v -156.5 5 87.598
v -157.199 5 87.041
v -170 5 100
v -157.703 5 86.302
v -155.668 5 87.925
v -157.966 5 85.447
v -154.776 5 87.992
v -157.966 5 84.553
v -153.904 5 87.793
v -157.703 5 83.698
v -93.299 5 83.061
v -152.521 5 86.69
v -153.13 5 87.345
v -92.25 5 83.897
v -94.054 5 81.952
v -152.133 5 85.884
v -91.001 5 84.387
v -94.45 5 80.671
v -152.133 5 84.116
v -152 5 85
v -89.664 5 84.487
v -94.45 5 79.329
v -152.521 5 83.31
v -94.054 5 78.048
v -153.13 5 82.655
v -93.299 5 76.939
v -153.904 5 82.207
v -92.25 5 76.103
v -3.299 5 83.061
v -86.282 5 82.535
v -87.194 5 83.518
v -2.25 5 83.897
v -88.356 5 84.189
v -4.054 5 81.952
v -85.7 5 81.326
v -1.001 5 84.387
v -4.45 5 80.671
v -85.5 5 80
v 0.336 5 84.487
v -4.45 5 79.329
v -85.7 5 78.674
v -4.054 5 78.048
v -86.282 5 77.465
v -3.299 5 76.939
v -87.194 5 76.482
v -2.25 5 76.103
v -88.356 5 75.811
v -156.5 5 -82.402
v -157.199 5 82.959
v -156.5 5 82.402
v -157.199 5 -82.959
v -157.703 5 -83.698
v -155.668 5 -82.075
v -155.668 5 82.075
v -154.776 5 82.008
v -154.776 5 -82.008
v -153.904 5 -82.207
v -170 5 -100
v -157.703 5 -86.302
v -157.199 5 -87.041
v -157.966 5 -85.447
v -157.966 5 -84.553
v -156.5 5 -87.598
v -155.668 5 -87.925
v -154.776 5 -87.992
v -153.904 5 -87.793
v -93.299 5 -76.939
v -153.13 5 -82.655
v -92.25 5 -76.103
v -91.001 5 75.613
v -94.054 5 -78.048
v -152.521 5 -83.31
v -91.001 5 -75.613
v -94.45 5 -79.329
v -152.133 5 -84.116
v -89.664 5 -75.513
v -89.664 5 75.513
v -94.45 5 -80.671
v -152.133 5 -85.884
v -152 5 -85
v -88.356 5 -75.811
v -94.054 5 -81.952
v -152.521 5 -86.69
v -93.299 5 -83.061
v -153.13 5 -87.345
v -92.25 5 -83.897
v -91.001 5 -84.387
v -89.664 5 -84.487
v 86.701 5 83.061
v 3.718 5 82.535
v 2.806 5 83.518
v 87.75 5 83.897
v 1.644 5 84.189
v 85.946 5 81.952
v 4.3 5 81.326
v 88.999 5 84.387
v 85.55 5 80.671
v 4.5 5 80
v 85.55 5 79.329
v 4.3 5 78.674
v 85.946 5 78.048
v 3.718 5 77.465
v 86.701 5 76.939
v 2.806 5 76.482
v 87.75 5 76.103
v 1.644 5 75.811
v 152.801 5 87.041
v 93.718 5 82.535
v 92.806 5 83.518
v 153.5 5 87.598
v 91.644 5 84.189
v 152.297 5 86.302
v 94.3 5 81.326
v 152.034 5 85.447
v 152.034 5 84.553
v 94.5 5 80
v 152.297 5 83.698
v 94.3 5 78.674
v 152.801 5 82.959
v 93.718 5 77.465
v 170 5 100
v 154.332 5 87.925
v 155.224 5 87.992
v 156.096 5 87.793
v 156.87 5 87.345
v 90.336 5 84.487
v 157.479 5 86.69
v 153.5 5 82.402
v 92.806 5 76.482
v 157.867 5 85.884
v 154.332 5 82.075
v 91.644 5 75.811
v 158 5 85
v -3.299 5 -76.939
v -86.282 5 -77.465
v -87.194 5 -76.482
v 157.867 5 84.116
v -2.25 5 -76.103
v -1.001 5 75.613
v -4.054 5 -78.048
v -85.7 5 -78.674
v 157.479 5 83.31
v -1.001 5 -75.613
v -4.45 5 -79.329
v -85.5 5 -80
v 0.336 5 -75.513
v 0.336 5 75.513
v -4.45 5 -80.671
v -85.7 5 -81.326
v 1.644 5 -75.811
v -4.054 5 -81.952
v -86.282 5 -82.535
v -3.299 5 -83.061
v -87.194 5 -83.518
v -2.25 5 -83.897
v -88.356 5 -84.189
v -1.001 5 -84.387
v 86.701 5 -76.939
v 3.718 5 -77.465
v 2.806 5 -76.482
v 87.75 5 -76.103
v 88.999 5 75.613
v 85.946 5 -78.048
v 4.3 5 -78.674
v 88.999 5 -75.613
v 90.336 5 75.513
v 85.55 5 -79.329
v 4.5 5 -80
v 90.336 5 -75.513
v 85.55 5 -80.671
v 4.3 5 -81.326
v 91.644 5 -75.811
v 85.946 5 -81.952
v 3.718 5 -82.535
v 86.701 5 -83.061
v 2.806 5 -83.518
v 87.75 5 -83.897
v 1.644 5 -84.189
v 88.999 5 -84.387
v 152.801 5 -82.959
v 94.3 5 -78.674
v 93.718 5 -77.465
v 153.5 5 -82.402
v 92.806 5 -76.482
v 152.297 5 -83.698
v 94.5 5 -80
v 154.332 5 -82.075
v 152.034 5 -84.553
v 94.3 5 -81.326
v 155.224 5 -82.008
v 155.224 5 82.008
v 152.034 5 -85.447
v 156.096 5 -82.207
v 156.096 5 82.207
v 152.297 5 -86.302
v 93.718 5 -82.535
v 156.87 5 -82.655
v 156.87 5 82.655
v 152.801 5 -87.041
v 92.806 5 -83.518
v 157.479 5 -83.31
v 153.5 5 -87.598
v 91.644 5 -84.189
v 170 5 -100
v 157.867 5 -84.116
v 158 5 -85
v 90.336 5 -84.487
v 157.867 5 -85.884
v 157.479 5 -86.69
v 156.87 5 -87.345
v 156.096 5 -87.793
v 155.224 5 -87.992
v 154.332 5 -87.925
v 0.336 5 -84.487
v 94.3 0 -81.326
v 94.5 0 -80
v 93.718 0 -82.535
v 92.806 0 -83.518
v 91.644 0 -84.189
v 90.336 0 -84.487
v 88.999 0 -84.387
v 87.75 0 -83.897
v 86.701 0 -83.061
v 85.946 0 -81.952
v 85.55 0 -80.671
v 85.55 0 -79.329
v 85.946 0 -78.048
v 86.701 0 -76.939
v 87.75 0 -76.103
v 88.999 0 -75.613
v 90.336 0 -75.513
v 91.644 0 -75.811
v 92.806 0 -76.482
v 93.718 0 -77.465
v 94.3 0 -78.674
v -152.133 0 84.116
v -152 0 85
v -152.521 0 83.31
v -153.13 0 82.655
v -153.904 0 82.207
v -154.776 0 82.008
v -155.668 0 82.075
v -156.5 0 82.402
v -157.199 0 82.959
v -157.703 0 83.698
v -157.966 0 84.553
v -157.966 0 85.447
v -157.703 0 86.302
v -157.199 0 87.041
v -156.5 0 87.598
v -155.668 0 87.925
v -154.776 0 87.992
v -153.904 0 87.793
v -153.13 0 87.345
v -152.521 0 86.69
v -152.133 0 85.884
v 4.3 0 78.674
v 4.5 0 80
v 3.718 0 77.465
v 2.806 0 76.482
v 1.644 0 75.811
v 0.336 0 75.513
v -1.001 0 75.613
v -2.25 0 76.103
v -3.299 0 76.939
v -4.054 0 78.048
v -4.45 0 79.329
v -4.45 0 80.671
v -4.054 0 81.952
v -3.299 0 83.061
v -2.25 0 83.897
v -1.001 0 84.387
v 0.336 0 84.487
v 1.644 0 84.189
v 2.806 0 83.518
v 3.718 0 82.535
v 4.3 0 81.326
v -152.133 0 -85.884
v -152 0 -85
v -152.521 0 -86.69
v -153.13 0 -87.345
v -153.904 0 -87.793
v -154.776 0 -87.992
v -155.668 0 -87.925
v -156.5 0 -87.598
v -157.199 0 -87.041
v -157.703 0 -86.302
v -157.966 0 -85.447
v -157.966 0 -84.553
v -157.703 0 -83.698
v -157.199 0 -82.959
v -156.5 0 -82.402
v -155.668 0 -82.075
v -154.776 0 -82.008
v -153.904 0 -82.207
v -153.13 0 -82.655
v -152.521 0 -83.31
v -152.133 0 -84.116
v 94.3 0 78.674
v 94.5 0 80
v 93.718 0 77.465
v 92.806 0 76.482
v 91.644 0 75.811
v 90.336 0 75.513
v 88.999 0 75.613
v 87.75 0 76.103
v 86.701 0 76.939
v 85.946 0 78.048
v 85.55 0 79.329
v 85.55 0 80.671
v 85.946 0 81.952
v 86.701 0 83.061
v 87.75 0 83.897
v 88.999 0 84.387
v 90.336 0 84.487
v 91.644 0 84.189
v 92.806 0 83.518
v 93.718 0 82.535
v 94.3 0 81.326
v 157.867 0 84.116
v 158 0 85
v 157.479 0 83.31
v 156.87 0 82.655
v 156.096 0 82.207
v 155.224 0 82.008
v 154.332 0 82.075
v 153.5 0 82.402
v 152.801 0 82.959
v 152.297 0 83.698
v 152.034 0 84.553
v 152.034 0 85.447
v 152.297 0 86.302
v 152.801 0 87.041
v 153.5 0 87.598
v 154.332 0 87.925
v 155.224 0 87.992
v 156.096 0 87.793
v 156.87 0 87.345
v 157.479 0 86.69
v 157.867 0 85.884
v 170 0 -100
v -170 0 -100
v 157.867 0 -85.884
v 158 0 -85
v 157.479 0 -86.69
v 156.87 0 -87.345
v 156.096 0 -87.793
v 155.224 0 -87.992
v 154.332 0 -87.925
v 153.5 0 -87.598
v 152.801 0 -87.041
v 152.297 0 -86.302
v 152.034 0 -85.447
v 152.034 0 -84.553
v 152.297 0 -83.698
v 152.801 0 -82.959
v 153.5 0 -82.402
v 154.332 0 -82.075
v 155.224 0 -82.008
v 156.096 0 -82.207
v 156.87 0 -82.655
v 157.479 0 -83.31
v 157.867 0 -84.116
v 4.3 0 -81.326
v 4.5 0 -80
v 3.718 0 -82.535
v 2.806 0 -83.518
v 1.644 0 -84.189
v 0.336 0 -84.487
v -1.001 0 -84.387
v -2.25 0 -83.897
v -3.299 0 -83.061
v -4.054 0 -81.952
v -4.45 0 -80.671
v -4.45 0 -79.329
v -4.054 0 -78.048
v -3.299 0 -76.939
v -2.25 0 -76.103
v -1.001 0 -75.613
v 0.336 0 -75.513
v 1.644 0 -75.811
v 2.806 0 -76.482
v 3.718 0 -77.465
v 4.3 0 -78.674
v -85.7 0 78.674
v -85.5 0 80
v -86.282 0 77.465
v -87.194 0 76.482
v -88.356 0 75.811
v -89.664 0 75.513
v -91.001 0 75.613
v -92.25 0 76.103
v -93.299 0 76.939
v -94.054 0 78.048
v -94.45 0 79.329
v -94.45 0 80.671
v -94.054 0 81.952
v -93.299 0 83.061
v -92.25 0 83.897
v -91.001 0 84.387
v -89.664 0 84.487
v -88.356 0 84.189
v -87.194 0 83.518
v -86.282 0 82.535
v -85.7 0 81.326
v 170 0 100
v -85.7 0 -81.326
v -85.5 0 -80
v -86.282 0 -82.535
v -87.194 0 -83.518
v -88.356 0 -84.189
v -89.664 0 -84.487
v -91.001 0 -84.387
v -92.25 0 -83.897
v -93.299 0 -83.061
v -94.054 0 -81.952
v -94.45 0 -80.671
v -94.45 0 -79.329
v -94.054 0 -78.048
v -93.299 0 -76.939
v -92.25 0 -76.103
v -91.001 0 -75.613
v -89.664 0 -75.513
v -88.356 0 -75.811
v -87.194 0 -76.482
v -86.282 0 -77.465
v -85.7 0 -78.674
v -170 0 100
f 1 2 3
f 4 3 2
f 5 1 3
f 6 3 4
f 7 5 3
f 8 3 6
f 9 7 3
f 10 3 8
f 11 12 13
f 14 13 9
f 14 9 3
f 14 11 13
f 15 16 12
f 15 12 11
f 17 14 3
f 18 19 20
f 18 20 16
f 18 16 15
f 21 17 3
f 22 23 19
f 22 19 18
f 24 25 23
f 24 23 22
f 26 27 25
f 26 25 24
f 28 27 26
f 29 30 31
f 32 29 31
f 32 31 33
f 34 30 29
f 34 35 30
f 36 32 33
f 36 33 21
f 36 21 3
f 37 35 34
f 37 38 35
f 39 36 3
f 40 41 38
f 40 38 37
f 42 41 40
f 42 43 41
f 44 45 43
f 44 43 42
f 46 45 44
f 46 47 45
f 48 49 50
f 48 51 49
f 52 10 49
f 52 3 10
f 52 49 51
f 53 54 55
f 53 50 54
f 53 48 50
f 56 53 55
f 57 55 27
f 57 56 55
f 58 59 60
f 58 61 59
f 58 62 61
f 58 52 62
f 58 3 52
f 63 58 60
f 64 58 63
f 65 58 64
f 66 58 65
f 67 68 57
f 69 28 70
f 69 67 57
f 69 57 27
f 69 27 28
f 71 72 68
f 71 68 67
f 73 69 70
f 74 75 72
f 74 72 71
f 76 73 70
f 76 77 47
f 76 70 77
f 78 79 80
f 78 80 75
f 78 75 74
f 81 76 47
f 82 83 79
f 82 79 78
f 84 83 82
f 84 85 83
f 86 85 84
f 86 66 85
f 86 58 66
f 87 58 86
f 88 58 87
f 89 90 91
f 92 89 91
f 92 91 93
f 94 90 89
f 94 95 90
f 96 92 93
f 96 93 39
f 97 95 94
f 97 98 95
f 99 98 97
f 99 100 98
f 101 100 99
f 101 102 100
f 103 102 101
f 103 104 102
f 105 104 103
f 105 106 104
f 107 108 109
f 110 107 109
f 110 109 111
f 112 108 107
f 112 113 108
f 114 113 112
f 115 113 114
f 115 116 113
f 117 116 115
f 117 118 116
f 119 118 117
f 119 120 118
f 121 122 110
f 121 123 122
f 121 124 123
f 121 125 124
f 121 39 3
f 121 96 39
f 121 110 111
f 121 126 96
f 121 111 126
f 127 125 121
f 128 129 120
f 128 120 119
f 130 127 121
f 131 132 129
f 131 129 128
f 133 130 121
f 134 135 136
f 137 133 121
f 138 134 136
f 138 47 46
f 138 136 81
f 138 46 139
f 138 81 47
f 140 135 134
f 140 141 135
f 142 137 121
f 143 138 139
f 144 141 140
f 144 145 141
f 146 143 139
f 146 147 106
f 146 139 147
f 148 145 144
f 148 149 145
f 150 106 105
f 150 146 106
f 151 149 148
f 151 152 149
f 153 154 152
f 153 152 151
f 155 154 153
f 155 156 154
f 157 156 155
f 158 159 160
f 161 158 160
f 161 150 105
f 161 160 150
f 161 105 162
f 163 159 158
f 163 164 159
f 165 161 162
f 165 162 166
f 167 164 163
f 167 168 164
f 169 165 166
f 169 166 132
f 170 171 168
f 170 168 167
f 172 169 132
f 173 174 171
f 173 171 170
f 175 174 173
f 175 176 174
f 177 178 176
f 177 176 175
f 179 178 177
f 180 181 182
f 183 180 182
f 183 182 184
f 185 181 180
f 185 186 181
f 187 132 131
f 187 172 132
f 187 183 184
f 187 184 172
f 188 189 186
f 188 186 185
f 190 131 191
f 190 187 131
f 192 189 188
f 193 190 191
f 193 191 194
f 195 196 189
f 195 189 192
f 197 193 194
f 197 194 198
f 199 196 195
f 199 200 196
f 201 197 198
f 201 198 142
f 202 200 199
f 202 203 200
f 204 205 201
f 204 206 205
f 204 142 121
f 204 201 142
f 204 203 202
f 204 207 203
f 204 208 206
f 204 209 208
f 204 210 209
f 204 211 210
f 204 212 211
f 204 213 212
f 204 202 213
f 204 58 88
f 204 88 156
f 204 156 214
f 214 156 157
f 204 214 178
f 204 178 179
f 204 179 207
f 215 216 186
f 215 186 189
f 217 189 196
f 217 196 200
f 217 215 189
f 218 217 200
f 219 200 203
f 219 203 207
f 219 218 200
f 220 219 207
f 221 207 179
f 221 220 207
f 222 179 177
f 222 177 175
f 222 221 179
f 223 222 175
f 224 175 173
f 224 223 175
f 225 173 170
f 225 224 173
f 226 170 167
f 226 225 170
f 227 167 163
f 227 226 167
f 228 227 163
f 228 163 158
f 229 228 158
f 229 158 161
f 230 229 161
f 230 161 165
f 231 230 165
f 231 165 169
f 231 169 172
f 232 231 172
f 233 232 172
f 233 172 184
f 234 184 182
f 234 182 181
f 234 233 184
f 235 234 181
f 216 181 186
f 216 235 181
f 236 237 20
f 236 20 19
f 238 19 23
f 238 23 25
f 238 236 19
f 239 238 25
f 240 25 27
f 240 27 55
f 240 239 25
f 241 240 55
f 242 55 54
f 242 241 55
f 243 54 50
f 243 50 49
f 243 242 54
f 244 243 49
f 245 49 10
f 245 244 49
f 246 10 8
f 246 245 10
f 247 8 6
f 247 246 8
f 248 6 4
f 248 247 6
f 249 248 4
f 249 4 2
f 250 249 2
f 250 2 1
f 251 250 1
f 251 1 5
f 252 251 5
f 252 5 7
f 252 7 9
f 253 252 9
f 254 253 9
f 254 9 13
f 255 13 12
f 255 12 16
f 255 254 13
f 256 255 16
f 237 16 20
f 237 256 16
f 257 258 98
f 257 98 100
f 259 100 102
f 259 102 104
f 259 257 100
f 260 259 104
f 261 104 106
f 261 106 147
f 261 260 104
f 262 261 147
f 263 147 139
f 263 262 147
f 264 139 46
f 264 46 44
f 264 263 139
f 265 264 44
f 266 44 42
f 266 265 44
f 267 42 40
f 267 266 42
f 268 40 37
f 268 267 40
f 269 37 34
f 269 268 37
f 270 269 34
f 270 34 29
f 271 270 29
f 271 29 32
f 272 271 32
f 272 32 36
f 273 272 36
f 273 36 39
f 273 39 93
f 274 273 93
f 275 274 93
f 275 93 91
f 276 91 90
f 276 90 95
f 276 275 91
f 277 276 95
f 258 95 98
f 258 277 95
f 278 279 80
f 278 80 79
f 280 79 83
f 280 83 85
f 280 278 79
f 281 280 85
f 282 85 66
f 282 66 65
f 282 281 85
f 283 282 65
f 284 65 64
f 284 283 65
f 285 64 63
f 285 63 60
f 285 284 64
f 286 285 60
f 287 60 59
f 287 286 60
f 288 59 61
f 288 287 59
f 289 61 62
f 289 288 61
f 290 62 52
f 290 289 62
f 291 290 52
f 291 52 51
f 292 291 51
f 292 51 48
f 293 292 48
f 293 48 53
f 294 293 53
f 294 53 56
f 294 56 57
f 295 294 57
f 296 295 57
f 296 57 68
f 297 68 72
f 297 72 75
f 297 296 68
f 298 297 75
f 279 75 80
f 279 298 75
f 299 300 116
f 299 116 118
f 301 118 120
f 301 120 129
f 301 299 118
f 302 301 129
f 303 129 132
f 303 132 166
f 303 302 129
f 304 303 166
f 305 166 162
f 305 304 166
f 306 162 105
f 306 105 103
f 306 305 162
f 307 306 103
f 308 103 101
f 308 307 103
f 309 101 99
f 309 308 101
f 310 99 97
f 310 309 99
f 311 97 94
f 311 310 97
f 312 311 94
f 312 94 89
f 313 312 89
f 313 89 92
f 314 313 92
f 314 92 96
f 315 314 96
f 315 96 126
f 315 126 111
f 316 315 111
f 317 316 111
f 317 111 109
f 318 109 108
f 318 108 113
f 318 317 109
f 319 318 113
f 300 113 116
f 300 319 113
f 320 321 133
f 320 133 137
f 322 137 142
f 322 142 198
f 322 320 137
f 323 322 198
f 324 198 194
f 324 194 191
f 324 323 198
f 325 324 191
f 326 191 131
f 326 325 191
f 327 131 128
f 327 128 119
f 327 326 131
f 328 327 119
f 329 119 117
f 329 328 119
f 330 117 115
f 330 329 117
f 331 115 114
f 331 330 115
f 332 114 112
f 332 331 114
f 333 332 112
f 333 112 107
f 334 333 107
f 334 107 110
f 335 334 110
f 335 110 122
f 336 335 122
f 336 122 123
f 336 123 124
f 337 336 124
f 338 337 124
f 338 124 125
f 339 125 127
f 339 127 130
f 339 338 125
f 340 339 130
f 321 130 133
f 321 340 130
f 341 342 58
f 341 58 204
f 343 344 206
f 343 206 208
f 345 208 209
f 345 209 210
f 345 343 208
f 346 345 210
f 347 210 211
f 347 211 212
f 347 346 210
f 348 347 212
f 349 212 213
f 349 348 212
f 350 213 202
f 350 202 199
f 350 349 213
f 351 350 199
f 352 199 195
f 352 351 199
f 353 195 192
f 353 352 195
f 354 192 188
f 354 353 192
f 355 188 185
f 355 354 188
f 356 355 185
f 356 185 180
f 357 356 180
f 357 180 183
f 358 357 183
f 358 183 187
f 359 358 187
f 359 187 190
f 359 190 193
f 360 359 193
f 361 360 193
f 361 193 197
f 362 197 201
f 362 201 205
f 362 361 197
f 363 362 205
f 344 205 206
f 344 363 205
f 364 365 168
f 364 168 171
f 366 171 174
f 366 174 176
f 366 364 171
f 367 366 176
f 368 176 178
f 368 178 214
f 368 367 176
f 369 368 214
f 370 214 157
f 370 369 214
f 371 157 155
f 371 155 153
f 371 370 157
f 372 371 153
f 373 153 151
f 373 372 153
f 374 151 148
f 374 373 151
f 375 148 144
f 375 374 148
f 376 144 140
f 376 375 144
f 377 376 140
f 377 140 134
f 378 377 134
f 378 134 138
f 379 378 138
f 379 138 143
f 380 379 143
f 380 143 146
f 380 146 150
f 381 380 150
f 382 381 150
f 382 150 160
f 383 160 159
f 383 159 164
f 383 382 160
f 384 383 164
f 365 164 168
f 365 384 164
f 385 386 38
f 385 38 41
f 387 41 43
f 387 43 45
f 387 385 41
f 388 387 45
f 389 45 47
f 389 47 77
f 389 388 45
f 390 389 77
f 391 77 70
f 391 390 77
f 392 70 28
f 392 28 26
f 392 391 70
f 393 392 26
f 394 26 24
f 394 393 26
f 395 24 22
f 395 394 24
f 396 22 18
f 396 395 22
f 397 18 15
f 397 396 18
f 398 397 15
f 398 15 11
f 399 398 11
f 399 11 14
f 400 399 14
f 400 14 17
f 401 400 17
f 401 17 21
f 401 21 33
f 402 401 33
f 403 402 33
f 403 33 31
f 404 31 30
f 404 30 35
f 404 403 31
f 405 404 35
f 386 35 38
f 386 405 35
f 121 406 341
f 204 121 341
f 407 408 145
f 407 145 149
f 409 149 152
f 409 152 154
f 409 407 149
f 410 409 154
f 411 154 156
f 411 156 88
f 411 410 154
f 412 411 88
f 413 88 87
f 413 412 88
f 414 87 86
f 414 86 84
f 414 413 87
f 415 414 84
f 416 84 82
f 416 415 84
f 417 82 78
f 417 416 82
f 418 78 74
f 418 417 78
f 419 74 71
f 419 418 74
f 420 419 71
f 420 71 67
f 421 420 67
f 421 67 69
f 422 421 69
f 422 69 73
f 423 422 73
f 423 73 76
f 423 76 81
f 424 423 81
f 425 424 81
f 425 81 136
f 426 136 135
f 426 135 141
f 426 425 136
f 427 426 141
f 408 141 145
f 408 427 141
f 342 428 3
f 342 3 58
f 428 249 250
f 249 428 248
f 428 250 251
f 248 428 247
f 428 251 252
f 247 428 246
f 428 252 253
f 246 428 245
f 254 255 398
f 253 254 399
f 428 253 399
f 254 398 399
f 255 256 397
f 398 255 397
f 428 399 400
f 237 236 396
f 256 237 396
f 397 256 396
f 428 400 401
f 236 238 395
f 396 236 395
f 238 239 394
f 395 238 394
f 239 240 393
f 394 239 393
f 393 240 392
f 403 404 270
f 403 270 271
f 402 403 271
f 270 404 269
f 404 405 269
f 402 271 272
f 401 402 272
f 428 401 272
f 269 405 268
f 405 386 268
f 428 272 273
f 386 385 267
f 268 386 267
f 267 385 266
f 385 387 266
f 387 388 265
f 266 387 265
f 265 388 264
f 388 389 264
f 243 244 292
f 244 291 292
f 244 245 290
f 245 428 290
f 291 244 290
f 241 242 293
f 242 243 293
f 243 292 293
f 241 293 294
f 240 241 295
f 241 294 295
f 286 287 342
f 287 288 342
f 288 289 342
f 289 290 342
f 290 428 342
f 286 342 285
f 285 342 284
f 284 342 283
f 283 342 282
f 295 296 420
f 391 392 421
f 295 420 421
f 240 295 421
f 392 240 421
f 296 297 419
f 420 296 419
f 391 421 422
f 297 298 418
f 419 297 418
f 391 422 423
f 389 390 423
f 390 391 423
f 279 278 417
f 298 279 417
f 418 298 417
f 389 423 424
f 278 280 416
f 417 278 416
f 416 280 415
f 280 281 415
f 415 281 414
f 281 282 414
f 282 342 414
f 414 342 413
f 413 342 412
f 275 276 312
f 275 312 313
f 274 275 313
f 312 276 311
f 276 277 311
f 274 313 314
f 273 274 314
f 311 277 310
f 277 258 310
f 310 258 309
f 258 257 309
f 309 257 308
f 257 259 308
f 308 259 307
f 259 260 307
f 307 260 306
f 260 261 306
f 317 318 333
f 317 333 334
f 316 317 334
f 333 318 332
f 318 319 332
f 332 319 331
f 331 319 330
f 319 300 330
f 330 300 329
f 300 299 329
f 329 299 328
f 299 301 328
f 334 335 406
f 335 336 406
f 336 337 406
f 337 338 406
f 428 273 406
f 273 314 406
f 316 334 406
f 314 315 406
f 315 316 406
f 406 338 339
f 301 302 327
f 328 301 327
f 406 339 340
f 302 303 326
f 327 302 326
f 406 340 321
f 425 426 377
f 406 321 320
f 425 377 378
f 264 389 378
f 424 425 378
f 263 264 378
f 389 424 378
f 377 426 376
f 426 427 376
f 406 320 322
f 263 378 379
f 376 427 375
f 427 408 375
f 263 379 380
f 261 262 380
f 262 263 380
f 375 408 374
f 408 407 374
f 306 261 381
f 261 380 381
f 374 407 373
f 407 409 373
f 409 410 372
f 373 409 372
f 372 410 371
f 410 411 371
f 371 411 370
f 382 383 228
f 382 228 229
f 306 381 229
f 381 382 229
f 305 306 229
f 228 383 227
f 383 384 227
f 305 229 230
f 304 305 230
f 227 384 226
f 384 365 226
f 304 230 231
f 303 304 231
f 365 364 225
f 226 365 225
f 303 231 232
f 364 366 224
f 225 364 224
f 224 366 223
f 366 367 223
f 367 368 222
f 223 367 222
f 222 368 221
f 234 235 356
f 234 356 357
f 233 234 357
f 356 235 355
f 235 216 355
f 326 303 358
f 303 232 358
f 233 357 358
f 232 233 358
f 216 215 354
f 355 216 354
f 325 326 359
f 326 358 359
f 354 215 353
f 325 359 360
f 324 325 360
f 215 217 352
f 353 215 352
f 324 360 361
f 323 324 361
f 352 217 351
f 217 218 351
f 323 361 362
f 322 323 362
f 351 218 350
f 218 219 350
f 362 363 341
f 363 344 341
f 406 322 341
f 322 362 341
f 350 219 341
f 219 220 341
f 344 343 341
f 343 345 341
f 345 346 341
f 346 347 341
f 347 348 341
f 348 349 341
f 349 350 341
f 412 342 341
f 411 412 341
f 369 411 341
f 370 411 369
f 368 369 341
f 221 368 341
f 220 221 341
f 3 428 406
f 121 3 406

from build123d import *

# Parameters (mm, degrees)
SKETCH1_W           = 340
SKETCH1_H           = 200
SKETCH1_R           = 3
SKETCH1_R_2         = 4.5
BOSS_EXTRUDE1_DEPTH = 5


with BuildPart() as part:
    # Sketch1 → Boss-Extrude1 (new body)
    with BuildSketch(Plane(origin=(0, 0, 0), x_dir=(1, 0, 0), z_dir=(0, 1, 0))):
        Rectangle(SKETCH1_W, SKETCH1_H)
        with Locations((155, 85)):
            Circle(SKETCH1_R, mode=Mode.SUBTRACT)
        with Locations((-155, 85)):
            Circle(SKETCH1_R, mode=Mode.SUBTRACT)
        with Locations((-155, -85)):
            Circle(SKETCH1_R, mode=Mode.SUBTRACT)
        with Locations((155, -85)):
            Circle(SKETCH1_R, mode=Mode.SUBTRACT)
        with Locations((0, 80)):
            Circle(SKETCH1_R_2, mode=Mode.SUBTRACT)
        with Locations((0, -80)):
            Circle(SKETCH1_R_2, mode=Mode.SUBTRACT)
        with Locations((90, 80)):
            Circle(SKETCH1_R_2, mode=Mode.SUBTRACT)
        with Locations((90, -80)):
            Circle(SKETCH1_R_2, mode=Mode.SUBTRACT)
        with Locations((-90, -80)):
            Circle(SKETCH1_R_2, mode=Mode.SUBTRACT)
        with Locations((-90, 80)):
            Circle(SKETCH1_R_2, mode=Mode.SUBTRACT)
    extrude(amount=BOSS_EXTRUDE1_DEPTH)


solid = part.part
